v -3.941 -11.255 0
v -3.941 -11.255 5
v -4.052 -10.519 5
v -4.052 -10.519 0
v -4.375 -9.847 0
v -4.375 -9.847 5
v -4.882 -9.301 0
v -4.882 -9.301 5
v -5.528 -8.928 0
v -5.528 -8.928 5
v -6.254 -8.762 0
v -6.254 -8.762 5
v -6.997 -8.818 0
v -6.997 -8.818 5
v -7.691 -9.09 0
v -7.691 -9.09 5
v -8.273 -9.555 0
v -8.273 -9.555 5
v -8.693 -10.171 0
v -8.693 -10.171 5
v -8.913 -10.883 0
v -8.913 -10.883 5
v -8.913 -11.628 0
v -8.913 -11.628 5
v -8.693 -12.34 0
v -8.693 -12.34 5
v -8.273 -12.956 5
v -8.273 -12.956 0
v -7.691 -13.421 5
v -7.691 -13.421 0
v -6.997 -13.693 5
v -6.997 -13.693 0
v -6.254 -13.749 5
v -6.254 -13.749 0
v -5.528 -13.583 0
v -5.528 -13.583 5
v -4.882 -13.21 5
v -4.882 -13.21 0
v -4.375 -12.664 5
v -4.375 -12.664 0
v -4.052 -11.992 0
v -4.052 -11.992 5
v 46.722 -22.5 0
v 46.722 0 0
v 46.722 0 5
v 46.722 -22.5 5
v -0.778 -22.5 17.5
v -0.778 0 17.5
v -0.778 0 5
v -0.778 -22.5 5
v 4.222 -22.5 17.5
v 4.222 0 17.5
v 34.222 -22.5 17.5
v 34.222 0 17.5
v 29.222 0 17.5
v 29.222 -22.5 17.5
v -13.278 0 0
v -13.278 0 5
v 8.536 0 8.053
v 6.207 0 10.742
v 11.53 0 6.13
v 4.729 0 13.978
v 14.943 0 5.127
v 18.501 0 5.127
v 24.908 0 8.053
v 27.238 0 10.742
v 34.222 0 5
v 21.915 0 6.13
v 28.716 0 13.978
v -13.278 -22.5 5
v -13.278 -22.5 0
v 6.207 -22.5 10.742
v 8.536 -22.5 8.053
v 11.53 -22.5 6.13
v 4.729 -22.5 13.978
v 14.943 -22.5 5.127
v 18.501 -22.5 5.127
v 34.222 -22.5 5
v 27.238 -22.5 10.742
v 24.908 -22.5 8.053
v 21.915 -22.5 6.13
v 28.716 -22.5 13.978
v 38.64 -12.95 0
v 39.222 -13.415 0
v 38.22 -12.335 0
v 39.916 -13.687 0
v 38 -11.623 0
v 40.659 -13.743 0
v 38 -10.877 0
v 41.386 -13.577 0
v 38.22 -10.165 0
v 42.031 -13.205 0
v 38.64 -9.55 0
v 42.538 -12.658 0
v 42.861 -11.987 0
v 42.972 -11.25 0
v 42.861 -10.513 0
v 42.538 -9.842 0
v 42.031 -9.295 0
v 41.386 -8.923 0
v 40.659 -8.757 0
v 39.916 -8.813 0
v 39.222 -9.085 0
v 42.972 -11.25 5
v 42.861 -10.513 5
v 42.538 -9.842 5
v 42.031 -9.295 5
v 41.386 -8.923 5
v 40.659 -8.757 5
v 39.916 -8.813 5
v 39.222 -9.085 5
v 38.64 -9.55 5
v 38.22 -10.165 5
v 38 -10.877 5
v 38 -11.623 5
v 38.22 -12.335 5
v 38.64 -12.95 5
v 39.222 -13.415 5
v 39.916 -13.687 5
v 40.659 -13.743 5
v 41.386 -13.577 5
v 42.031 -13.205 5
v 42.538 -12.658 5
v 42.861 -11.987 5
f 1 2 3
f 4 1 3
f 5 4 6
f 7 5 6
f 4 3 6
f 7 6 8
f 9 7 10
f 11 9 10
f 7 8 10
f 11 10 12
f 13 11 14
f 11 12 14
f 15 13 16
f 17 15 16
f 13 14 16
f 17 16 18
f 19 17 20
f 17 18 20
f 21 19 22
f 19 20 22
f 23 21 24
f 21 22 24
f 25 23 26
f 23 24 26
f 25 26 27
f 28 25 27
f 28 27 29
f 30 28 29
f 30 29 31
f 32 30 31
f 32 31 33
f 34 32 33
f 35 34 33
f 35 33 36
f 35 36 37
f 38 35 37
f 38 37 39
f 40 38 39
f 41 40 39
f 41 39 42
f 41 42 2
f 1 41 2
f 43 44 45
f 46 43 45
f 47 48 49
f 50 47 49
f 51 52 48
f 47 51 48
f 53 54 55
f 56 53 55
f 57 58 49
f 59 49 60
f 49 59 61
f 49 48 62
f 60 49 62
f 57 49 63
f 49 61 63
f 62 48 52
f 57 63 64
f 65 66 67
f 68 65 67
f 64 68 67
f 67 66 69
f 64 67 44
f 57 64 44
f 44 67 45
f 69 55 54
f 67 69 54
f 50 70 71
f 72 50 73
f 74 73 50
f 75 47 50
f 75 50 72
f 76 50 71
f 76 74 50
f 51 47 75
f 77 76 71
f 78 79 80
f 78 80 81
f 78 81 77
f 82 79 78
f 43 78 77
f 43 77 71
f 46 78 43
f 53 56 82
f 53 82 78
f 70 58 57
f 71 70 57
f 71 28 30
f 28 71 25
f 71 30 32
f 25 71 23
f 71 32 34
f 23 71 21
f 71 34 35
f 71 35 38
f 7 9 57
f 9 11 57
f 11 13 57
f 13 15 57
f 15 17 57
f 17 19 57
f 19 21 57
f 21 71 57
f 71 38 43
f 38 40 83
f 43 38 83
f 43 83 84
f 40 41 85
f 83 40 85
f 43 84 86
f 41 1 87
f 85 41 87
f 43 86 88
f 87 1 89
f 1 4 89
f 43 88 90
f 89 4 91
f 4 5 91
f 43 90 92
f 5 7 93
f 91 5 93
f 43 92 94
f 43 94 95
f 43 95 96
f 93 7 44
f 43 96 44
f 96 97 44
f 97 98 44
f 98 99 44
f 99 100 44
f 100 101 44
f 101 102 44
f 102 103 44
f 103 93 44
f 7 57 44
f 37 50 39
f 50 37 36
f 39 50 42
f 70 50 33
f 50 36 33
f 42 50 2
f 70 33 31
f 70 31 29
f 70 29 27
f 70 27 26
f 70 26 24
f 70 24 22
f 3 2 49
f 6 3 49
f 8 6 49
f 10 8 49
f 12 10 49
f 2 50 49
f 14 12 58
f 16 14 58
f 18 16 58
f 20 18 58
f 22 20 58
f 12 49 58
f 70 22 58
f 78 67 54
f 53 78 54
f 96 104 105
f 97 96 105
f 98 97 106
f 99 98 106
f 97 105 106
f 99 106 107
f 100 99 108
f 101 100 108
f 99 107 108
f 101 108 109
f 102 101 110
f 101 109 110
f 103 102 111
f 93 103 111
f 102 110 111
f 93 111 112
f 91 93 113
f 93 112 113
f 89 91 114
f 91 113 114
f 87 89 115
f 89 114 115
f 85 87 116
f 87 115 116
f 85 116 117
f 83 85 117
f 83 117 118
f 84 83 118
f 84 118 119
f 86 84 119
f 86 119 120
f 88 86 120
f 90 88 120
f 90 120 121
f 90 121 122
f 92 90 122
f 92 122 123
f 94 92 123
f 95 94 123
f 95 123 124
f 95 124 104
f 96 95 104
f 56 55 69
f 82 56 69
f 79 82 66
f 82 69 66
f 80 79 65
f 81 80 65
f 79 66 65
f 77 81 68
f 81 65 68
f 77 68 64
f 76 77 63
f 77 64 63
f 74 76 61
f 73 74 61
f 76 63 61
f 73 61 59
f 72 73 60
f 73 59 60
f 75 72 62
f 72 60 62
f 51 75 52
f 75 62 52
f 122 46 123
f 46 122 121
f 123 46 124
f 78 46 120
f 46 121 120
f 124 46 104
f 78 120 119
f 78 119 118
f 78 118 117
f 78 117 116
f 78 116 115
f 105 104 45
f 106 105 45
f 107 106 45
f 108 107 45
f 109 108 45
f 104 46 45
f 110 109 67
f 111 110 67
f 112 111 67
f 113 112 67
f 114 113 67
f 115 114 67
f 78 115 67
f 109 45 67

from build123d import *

# Parameters (mm, degrees)
F1_DEPTH = 22.5
F2_R     = 2.5
F3_DEPTH = 5.001
F4_DEPTH = 5.001


with BuildPart() as f1:
    # F0 (on Front) → F1 (new body)
    with BuildSketch(Plane.XZ):
        with BuildLine():
            Line((-13.277779, 5), (-13.277779, 0))
            Line((-13.277779, 0), (46.722221, 0))
            Line((46.722221, 0), (46.722221, 5))
            Line((46.722221, 5), (34.222221, 5))
            Line((34.222221, 5), (34.222221, 17.5))
            Line((34.222221, 17.5), (29.222221, 17.5))
            ThreePointArc((29.222221, 17.5), (16.722221, 5), (4.222221, 17.5))
            Line((4.222221, 17.5), (-0.777779, 17.5))
            Line((-0.777779, 17.5), (-0.777779, 5))
            Line((-0.777779, 5), (-13.277779, 5))
        make_face()
    extrude(amount=F1_DEPTH)

    # F2 (on face) → F3 (cut, through all)
    with BuildSketch(Plane.XY.offset(5)):
        with Locations((40.472221, -11.25)):
            Circle(F2_R)
    extrude(amount=-F3_DEPTH, mode=Mode.SUBTRACT)

    # F2 (on face) → F4 (cut, through all)
    with BuildSketch(Plane.XY.offset(5)):
        with Locations((-6.440863, -11.255497)):
            Circle(F2_R)
    extrude(amount=-F4_DEPTH, mode=Mode.SUBTRACT)


solid = f1.part
